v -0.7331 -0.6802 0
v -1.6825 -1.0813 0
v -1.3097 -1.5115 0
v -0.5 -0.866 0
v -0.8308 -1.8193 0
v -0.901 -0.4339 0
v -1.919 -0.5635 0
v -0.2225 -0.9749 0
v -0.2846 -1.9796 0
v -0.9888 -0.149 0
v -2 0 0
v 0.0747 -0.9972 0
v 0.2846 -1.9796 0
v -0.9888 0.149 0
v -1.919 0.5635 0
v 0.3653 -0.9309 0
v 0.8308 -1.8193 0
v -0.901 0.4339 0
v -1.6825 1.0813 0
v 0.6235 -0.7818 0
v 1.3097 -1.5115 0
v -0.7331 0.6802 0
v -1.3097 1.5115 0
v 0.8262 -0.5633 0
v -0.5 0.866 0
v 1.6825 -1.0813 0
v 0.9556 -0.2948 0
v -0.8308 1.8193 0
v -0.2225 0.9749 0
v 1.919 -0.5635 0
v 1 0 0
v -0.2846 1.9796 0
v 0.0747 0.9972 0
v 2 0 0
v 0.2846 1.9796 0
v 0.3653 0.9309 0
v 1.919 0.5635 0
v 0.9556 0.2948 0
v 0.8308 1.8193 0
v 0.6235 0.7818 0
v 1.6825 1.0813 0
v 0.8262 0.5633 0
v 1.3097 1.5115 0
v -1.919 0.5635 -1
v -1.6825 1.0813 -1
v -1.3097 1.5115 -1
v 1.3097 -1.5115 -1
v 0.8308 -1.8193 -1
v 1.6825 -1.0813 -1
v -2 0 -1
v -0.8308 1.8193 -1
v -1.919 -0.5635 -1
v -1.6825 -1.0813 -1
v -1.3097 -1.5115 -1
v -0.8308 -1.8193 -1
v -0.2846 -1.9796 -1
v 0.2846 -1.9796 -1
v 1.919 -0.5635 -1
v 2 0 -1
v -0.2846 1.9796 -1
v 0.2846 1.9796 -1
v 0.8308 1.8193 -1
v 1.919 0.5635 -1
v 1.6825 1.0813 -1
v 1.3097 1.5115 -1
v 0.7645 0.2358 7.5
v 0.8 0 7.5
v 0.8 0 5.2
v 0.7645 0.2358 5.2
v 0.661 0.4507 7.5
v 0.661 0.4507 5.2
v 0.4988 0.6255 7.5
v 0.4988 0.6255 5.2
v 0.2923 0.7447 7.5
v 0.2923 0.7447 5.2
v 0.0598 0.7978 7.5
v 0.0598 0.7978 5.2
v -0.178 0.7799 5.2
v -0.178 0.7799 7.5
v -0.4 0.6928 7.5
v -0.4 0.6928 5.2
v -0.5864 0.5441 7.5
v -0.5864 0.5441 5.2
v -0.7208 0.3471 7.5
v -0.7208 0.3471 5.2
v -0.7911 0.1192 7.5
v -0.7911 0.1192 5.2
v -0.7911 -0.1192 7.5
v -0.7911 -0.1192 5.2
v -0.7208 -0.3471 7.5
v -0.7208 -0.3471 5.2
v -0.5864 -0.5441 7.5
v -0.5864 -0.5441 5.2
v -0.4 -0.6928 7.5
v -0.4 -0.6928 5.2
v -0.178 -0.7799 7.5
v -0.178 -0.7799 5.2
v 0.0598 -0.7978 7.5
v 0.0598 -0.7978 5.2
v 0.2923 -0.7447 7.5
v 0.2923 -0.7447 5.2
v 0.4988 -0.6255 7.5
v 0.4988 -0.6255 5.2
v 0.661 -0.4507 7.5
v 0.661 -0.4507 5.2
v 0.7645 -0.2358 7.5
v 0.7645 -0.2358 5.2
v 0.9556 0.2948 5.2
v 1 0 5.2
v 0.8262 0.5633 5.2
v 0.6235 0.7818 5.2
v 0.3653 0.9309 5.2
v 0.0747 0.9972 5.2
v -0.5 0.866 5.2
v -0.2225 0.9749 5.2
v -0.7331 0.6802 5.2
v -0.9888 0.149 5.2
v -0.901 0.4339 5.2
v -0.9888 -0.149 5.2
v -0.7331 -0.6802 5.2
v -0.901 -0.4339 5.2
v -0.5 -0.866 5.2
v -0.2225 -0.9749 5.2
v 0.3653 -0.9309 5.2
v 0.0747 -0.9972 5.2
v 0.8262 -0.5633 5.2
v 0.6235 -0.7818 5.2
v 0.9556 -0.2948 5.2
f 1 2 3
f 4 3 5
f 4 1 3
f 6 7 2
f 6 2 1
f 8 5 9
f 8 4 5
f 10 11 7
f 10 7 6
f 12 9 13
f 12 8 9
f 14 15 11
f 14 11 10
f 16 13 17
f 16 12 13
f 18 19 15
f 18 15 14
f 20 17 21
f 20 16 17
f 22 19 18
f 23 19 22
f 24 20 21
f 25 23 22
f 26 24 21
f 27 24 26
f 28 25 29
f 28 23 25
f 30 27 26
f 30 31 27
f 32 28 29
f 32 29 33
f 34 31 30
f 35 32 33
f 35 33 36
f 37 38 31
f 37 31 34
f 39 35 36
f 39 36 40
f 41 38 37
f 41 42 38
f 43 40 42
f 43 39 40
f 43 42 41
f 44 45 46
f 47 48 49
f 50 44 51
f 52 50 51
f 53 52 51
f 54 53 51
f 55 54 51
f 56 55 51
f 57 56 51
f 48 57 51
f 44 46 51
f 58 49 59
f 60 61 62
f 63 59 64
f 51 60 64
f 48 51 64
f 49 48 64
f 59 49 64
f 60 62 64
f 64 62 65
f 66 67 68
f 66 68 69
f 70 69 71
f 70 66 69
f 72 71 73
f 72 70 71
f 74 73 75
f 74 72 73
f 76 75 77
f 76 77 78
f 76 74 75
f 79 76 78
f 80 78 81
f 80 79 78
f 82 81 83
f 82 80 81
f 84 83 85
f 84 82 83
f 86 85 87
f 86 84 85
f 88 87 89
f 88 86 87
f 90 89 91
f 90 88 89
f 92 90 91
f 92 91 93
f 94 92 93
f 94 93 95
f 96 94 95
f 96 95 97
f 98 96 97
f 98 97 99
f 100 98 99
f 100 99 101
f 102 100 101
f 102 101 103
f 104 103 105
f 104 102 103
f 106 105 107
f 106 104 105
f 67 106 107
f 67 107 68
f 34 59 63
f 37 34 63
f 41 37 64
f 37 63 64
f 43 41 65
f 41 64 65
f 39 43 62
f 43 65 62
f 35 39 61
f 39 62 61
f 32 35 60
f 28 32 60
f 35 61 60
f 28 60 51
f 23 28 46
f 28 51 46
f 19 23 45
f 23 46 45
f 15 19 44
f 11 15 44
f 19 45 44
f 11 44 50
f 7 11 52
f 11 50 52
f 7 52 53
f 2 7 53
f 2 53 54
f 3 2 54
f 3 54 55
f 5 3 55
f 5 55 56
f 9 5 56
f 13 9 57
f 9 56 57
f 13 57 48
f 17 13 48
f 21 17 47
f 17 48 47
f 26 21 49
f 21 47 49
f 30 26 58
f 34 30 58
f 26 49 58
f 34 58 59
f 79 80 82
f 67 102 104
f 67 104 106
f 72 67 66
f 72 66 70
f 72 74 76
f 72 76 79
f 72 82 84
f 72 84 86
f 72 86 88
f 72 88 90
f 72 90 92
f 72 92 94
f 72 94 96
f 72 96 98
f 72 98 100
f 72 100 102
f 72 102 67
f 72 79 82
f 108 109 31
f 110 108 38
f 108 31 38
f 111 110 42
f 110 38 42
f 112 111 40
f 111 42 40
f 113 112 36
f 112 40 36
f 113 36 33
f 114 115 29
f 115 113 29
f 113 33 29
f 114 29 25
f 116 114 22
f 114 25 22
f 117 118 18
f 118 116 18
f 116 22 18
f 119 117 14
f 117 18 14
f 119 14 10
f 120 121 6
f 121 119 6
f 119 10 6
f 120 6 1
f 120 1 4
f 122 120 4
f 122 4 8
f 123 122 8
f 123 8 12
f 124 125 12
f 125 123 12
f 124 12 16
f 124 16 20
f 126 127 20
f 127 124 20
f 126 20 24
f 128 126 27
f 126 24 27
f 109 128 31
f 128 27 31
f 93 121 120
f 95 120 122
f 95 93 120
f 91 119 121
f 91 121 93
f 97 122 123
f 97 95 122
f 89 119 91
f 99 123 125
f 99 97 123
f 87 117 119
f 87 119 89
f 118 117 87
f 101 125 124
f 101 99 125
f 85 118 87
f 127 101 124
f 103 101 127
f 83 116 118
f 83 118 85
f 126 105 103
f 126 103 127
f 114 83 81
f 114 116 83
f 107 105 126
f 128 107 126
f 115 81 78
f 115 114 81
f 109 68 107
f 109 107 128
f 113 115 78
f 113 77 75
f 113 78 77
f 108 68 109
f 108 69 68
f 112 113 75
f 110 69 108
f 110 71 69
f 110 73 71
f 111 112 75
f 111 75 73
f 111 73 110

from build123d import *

# Parameters (mm, degrees)
REFERENCE_HEAD_START           = -1
SKETCH1_R                      = 2
REFERENCE_HEAD_DEPTH           = 1
SKETCH2_R                      = 1
REFERENCE_SHANK_DEPTH          = 7.5
SKETCH3_R                      = 1.01
SKETCH3_R_2                    = 0.8
M1P6_END_THREAD_ENVELOPE_DEPTH = 2.3


with BuildPart() as part:
    # Sketch1 → Reference_Head (new body)
    with BuildSketch(Plane.XY.offset(REFERENCE_HEAD_START)):
        Circle(SKETCH1_R)
    extrude(amount=REFERENCE_HEAD_DEPTH)

    # Sketch2 → Reference_Shank (add)
    with BuildSketch(Plane.XY):
        Circle(SKETCH2_R)
    extrude(amount=REFERENCE_SHANK_DEPTH)

    # Sketch3 → M1p6_End_Thread_Envelope (cut)
    with BuildSketch(Plane.XY.offset(7.5)):
        Circle(SKETCH3_R)
        Circle(SKETCH3_R_2, mode=Mode.SUBTRACT)
    extrude(amount=-M1P6_END_THREAD_ENVELOPE_DEPTH, mode=Mode.SUBTRACT)


solid = part.part
